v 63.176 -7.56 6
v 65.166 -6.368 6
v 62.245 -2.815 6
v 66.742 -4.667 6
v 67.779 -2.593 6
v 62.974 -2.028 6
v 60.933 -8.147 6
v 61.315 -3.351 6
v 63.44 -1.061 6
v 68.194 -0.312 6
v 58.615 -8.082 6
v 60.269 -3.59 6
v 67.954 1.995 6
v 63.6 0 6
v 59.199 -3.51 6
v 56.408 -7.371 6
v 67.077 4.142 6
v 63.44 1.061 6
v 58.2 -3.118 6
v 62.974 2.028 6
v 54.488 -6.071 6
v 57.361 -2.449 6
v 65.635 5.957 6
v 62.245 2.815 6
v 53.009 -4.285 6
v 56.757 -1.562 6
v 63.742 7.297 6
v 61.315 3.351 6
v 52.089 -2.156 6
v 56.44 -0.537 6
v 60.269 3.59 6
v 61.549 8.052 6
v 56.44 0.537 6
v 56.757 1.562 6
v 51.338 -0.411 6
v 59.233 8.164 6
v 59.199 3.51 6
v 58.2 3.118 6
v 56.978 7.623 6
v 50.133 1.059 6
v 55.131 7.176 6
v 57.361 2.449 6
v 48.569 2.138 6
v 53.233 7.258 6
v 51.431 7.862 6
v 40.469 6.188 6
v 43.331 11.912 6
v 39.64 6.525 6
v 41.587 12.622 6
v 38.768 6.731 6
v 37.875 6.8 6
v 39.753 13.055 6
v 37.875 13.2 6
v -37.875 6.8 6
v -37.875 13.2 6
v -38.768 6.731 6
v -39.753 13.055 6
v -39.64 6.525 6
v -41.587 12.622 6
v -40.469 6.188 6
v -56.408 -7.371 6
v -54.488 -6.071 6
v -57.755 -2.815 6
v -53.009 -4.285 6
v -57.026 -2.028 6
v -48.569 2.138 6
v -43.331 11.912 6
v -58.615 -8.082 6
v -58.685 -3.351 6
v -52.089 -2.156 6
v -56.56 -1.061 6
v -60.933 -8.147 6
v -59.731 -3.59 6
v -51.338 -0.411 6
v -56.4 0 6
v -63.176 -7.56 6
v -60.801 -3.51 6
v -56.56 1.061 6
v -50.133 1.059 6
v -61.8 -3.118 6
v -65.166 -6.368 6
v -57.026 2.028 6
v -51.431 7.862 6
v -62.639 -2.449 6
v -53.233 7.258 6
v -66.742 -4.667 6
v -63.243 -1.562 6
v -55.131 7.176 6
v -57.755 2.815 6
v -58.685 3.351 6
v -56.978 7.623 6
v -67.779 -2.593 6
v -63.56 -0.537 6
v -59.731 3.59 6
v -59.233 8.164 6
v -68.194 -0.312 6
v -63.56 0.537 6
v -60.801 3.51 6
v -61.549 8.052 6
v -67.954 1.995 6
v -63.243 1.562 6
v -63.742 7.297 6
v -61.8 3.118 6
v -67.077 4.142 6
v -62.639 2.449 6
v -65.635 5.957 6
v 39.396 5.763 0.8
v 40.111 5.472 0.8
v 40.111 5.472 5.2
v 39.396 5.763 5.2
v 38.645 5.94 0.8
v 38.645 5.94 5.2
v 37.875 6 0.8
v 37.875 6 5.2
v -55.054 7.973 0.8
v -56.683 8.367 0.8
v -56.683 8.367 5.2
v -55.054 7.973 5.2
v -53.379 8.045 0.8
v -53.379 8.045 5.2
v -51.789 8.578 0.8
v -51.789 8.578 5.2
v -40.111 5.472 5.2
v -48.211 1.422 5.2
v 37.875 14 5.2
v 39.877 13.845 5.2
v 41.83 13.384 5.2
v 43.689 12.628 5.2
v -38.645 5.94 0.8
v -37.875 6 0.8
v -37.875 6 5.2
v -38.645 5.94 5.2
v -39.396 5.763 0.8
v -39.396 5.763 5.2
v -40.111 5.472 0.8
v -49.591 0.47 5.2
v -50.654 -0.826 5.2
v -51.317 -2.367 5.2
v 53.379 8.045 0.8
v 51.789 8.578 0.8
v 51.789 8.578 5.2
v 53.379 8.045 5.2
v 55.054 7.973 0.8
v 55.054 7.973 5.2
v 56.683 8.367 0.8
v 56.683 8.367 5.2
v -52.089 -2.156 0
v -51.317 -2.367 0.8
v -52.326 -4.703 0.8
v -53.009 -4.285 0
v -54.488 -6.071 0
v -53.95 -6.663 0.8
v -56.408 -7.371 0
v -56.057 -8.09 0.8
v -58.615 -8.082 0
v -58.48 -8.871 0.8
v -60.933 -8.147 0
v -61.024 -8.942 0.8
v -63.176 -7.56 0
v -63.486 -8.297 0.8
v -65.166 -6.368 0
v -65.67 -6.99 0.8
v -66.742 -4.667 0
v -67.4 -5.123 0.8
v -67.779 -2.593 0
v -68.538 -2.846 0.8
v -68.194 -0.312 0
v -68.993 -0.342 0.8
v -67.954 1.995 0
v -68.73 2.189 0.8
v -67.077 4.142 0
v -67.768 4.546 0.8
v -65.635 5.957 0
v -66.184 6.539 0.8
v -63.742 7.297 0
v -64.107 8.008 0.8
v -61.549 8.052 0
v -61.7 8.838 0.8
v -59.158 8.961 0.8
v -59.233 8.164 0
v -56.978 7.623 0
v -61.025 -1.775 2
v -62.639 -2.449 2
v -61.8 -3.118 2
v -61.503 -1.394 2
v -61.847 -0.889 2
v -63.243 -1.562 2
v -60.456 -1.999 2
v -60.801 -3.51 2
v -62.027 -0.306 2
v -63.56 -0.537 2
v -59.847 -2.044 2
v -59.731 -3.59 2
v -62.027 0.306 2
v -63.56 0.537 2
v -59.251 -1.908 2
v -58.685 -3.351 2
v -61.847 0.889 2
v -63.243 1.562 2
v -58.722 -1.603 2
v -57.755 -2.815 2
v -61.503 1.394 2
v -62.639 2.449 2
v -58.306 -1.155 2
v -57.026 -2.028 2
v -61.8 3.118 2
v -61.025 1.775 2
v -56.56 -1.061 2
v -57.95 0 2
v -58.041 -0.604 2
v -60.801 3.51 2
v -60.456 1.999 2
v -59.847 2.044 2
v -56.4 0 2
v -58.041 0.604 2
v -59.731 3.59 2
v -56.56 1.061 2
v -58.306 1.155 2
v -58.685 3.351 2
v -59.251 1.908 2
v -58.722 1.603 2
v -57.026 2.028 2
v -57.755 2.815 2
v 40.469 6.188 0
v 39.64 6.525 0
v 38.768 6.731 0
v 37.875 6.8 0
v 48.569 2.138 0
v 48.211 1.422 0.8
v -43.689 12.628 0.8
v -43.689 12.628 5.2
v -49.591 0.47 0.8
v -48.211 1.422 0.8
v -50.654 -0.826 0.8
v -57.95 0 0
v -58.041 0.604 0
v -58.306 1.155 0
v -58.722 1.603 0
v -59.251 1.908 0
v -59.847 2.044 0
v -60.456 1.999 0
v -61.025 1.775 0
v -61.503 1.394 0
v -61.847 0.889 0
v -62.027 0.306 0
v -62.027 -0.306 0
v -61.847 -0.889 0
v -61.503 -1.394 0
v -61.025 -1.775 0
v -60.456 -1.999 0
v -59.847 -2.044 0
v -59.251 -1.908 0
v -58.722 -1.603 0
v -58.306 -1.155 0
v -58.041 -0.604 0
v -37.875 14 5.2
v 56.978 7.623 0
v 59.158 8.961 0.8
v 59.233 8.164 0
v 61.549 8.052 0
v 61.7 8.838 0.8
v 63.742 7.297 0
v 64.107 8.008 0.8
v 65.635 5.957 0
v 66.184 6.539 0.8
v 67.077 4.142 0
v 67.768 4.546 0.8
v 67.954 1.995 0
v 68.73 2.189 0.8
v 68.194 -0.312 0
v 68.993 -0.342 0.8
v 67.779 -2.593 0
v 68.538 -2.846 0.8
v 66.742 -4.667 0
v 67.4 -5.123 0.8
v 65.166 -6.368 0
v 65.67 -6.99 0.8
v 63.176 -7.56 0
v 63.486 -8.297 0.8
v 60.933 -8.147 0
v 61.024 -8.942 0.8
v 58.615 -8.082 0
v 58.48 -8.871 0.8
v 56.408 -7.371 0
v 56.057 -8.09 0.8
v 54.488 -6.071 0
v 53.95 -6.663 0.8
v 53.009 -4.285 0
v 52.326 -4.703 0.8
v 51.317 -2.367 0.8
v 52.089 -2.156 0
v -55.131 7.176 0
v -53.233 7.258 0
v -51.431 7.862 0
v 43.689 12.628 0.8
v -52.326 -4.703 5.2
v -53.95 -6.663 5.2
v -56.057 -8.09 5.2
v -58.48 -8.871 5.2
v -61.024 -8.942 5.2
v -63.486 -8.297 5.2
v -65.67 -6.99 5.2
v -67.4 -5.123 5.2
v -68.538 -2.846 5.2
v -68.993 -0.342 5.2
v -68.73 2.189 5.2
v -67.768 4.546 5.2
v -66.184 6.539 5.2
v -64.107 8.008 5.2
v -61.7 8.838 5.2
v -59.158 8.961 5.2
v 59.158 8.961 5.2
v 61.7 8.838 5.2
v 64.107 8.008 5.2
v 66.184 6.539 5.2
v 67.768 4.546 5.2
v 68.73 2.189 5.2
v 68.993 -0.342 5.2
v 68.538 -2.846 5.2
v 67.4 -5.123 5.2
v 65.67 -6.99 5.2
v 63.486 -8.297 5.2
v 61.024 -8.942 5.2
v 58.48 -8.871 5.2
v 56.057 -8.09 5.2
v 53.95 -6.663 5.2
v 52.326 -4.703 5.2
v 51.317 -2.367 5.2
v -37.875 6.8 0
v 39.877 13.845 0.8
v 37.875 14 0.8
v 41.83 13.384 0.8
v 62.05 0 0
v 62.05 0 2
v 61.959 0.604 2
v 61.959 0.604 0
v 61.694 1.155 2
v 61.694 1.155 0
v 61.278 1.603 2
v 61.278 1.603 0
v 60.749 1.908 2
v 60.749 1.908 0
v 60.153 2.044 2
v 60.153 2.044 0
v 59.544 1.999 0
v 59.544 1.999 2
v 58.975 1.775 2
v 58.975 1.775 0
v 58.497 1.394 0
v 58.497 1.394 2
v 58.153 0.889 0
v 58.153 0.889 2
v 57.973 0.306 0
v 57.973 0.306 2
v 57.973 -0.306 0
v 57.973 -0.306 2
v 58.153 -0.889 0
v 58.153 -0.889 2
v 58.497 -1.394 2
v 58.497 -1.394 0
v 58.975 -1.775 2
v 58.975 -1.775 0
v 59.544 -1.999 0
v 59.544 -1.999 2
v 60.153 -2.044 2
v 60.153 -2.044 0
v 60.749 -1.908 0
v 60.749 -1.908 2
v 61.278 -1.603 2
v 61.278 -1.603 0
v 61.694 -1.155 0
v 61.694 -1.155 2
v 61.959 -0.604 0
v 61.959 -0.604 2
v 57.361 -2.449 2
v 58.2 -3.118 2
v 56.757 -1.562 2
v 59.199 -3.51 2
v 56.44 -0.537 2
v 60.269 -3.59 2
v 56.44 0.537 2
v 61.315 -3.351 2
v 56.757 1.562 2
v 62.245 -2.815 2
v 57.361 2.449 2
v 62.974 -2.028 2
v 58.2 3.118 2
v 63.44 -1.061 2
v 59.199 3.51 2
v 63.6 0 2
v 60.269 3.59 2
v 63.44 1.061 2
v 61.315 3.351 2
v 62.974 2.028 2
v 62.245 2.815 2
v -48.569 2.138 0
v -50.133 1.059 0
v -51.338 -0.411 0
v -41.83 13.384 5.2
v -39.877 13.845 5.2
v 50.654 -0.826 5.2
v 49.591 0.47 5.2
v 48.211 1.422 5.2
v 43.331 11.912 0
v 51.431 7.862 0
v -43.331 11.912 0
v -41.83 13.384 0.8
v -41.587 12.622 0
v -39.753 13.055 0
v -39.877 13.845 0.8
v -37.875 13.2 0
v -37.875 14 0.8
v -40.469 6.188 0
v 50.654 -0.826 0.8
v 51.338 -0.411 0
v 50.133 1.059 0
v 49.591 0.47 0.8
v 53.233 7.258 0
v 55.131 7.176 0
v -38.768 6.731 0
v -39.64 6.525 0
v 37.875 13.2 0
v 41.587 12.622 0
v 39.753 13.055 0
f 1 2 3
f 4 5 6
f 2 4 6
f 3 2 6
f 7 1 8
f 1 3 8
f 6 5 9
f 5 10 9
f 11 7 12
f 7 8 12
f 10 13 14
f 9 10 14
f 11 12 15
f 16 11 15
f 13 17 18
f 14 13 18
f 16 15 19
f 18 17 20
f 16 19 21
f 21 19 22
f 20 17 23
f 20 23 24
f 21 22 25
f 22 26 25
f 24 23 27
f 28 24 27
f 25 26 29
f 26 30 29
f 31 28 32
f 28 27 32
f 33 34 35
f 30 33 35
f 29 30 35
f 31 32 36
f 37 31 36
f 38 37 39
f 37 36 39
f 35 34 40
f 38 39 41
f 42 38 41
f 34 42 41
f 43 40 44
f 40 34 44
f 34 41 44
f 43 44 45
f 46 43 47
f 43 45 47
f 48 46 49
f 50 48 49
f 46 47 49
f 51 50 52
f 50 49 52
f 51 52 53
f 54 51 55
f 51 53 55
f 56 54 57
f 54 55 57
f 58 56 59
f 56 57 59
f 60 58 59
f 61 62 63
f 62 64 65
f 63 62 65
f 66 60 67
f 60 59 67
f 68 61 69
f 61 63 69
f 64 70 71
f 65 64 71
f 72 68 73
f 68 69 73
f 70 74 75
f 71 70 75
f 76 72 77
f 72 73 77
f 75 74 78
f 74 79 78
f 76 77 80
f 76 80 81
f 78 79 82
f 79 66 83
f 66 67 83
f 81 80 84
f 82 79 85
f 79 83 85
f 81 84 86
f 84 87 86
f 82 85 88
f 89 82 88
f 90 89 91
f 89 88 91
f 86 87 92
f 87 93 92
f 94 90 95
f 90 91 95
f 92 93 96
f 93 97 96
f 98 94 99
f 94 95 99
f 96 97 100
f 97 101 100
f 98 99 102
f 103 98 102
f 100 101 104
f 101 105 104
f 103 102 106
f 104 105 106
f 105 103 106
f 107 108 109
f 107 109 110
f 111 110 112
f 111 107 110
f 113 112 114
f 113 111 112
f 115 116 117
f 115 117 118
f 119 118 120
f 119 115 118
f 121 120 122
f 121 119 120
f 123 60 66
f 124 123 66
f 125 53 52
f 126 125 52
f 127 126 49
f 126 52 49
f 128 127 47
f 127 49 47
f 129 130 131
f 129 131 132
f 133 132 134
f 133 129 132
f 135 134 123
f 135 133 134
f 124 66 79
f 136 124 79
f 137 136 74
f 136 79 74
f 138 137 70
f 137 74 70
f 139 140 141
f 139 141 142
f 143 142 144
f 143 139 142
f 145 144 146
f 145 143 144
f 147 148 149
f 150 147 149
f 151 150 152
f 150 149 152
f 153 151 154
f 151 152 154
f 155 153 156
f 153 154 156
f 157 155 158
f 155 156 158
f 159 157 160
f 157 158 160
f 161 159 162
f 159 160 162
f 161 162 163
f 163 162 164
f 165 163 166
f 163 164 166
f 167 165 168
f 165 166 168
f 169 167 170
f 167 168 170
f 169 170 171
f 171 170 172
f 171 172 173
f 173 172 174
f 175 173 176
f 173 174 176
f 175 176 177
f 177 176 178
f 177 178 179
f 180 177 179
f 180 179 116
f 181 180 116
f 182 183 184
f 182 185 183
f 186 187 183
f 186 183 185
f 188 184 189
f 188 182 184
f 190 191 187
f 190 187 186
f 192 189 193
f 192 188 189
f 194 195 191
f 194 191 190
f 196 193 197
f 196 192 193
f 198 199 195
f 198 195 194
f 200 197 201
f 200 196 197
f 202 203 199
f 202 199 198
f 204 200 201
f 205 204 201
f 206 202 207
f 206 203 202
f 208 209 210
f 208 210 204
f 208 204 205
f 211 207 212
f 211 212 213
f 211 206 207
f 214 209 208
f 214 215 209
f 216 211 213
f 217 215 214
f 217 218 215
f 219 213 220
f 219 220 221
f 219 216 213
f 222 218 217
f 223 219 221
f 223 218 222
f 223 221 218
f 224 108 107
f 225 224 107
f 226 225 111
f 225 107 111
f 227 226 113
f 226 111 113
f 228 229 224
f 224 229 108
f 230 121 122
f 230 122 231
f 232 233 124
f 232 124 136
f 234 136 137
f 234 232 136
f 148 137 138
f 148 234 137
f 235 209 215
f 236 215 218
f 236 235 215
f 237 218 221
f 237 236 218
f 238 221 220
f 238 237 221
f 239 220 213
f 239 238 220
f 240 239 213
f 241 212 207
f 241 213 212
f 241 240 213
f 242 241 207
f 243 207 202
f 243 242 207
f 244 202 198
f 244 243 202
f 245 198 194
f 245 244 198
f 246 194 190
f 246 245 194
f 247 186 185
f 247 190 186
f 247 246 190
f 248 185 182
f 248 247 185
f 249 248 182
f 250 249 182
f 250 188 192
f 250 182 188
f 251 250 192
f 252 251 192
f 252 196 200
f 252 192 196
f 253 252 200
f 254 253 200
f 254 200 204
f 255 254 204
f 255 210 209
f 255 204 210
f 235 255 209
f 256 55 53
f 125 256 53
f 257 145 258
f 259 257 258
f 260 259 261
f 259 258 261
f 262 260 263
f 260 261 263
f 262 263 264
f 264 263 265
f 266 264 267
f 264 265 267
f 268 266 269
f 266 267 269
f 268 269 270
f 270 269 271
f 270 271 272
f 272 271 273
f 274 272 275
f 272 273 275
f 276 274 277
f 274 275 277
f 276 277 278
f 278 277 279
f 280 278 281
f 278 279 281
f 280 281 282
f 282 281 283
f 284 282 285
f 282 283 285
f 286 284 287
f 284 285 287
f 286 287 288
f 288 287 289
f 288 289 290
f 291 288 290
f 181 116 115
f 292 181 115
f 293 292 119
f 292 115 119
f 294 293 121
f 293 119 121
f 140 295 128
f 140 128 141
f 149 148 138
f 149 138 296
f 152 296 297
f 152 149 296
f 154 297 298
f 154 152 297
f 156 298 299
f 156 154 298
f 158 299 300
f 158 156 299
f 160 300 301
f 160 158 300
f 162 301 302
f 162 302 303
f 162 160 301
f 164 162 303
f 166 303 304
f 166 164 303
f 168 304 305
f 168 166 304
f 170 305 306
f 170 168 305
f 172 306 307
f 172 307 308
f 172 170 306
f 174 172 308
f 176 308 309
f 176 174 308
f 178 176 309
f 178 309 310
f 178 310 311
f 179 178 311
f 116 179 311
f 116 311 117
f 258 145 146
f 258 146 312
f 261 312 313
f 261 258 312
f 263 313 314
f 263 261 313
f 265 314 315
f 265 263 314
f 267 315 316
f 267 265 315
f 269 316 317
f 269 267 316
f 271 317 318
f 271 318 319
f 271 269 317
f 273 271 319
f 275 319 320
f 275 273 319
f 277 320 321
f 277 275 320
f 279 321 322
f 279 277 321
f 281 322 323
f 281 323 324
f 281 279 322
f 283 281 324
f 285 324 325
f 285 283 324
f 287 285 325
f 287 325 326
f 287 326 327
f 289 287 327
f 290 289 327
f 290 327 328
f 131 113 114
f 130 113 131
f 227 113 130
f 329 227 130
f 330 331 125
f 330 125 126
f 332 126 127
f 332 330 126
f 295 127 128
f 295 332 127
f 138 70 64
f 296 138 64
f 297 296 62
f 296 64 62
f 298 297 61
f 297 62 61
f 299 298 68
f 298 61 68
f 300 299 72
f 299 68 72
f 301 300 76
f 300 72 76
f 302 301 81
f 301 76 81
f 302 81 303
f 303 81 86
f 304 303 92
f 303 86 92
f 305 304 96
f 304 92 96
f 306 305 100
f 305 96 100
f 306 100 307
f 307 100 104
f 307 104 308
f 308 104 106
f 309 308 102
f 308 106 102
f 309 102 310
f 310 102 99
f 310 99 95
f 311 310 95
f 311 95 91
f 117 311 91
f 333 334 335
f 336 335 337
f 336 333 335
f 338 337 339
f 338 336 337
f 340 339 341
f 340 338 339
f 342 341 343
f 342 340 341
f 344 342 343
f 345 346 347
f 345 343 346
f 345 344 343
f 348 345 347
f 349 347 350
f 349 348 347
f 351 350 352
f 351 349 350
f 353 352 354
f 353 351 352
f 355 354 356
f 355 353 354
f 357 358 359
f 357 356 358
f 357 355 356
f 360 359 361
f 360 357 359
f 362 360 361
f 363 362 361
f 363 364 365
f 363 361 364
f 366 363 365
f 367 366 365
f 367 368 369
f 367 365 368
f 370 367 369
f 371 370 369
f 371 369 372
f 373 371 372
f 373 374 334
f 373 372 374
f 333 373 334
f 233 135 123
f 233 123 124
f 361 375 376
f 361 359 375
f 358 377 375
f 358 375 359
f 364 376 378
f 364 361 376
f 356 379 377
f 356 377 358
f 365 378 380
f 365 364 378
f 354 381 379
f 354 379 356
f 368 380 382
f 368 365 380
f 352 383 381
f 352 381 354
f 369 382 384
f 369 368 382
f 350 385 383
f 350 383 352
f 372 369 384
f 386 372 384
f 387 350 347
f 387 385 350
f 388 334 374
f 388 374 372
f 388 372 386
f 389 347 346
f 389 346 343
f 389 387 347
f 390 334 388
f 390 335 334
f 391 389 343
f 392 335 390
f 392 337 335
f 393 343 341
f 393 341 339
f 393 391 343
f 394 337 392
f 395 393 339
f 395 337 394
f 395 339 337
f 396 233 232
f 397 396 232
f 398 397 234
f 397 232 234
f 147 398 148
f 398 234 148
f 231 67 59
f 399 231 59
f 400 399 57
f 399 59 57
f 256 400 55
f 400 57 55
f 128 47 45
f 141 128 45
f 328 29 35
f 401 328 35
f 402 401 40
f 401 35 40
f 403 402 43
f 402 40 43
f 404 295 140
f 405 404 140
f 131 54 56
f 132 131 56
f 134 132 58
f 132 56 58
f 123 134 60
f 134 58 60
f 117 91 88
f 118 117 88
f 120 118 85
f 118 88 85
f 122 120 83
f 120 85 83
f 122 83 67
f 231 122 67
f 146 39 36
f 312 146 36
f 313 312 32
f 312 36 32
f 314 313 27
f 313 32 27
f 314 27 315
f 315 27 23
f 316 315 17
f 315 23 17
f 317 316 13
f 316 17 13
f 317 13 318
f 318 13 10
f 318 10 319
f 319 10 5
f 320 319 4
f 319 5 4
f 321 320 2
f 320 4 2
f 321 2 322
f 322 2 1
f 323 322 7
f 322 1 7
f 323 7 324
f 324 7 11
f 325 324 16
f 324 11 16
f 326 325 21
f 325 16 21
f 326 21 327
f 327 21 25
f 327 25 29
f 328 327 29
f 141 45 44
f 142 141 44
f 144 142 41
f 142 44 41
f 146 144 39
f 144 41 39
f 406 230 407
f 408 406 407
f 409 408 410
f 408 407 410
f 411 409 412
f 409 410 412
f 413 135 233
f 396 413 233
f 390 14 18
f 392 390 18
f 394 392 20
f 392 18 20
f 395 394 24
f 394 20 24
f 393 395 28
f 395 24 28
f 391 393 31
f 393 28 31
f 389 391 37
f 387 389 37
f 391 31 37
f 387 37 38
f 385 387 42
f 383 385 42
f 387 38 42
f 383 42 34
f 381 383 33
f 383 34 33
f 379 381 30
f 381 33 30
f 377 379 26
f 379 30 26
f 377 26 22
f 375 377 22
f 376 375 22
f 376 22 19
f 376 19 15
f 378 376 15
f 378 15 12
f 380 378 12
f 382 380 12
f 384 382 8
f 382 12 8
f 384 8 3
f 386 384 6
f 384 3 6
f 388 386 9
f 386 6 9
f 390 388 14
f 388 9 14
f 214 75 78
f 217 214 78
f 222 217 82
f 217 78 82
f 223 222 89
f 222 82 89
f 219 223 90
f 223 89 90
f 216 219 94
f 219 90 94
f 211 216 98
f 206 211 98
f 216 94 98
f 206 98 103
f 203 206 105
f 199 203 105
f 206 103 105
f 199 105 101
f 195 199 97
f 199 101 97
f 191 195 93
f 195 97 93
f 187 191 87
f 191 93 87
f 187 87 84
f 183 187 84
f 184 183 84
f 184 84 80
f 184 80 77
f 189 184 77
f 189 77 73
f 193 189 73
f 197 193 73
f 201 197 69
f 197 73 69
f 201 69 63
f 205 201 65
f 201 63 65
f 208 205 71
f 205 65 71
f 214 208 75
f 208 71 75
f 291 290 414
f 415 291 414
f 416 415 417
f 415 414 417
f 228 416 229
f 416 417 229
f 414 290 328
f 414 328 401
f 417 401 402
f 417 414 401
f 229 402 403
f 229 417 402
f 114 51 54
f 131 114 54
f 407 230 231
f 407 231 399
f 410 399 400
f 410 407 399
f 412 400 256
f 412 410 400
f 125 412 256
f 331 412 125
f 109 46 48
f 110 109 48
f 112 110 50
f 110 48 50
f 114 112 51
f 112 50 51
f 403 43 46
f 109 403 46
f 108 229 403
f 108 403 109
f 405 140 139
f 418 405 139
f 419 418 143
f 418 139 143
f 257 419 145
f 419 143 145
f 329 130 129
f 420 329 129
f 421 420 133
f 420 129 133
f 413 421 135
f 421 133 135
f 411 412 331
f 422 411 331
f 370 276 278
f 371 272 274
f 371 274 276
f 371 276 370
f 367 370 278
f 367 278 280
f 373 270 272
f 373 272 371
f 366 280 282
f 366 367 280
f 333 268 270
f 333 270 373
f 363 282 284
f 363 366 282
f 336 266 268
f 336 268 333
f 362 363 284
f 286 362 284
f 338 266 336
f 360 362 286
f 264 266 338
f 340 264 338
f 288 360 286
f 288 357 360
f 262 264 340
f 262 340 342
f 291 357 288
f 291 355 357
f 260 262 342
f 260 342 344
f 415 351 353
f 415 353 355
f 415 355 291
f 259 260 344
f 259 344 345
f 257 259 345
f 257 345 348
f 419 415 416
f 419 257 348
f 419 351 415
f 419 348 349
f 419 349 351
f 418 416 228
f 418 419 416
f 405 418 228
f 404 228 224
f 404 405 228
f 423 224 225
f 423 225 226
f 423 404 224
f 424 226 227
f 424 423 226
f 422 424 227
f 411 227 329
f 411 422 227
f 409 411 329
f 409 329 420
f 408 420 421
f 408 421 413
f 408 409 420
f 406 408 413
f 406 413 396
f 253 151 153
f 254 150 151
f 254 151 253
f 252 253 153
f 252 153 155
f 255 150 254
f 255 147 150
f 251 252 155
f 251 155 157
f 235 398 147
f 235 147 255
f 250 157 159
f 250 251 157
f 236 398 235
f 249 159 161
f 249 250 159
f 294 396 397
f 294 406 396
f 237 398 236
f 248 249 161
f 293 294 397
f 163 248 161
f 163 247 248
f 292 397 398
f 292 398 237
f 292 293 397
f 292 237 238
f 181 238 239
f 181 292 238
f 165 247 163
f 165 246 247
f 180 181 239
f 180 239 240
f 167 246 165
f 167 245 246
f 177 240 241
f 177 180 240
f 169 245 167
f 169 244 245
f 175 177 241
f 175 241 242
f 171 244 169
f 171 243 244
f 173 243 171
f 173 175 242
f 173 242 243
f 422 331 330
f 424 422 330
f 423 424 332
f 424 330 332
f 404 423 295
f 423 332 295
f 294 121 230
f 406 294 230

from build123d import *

# Parameters (mm, degrees)
SKETCH1_R           = 2.05
BOSS_EXTRUDE1_DEPTH = 6
SKETCH3_R           = 3.6
CUT_EXTRUDE1_DEPTH  = 4
CHAMFER3_SIZE       = 0.8


with BuildPart() as part:
    # Sketch1 → Boss-Extrude1 (new body)
    with BuildSketch(Plane.XY):
        with BuildLine():
            Line((-51.788854382, 8.577708764), (-43.689164944, 12.627553483))
            ThreePointArc((-43.689164944, 12.627553483), (-40.86217617, 13.652236863), (-37.875388203, 14))
            Line((-37.875388203, 14), (37.875388203, 14))
            ThreePointArc((37.875388203, 14), (40.86217617, 13.652236863), (43.689164944, 12.627553483))
            Line((43.689164944, 12.627553483), (51.788854382, 8.577708764))
            ThreePointArc((51.788854382, 8.577708764), (54.213536442, 7.949847309), (56.683281573, 8.366563146))
            ThreePointArc((56.683281573, 8.366563146), (68.049844719, -4.024922359), (51.316718427, -2.366563146))
            ThreePointArc((51.316718427, -2.366563146), (50.168244018, -0.140737539), (48.211145618, 1.422291236))
            Line((48.211145618, 1.422291236), (40.11145618, 5.472135955))
            ThreePointArc((40.11145618, 5.472135955), (39.024152805, 5.866244947), (37.875388203, 6))
            Line((37.875388203, 6), (-37.875388203, 6))
            ThreePointArc((-37.875388203, 6), (-39.024152805, 5.866244947), (-40.11145618, 5.472135955))
            Line((-40.11145618, 5.472135955), (-48.211145618, 1.422291236))
            ThreePointArc((-48.211145618, 1.422291236), (-50.168244018, -0.140737539), (-51.316718427, -2.366563146))
            ThreePointArc((-51.316718427, -2.366563146), (-68.049844719, -4.024922359), (-56.683281573, 8.366563146))
            ThreePointArc((-56.683281573, 8.366563146), (-54.213536442, 7.949847309), (-51.788854382, 8.577708764))
        make_face()
        with Locations((-60, 0)):
            Circle(SKETCH1_R, mode=Mode.SUBTRACT)
        with Locations((60, 0)):
            Circle(SKETCH1_R, mode=Mode.SUBTRACT)
    extrude(amount=BOSS_EXTRUDE1_DEPTH)

    # Sketch3 → Cut-Extrude1 (cut)
    with BuildSketch(Plane.XY.offset(6)):
        with Locations((-60, 0)):
            Circle(SKETCH3_R)
        with Locations((60, 0)):
            Circle(SKETCH3_R)
    extrude(amount=-CUT_EXTRUDE1_DEPTH, mode=Mode.SUBTRACT)

    # Chamfer3
    chamfer3_edges = [part.edges().sort_by_distance(p)[0] for p in [
        (-40.86217617, 13.652236863, 6),
        (47.739009663, 10.602631123, 0),
        (54.213536442, 7.949847309, 0),
        (68.049844719, -4.024922359, 0),
        (-47.739009663, 10.602631123, 6),
        (50.168244018, -0.140737539, 0),
        (44.161300899, 3.447213595, 0),
        (39.024152805, 5.866244947, 0),
        (0, 6, 0),
        (-39.024152805, 5.866244947, 0),
        (-44.161300899, 3.447213595, 0),
        (-50.168244018, -0.140737539, 0),
        (-68.049844719, -4.024922359, 0),
        (-54.213536442, 7.949847309, 0),
        (-47.739009663, 10.602631123, 0),
        (-54.213536442, 7.949847309, 6),
        (-40.86217617, 13.652236863, 0),
        (0, 14, 0),
        (40.86217617, 13.652236863, 0),
        (-68.049844719, -4.024922359, 6),
        (-50.168244018, -0.140737539, 6),
        (-44.161300899, 3.447213595, 6),
        (-39.024152805, 5.866244947, 6),
        (0, 6, 6),
        (39.024152805, 5.866244947, 6),
        (44.161300899, 3.447213595, 6),
        (40.86217617, 13.652236863, 6),
        (50.168244018, -0.140737539, 6),
        (68.049844719, -4.024922359, 6),
        (54.213536442, 7.949847309, 6),
        (47.739009663, 10.602631123, 6),
        (0, 14, 6),
    ]]
    chamfer(chamfer3_edges, length=CHAMFER3_SIZE)


solid = part.part
